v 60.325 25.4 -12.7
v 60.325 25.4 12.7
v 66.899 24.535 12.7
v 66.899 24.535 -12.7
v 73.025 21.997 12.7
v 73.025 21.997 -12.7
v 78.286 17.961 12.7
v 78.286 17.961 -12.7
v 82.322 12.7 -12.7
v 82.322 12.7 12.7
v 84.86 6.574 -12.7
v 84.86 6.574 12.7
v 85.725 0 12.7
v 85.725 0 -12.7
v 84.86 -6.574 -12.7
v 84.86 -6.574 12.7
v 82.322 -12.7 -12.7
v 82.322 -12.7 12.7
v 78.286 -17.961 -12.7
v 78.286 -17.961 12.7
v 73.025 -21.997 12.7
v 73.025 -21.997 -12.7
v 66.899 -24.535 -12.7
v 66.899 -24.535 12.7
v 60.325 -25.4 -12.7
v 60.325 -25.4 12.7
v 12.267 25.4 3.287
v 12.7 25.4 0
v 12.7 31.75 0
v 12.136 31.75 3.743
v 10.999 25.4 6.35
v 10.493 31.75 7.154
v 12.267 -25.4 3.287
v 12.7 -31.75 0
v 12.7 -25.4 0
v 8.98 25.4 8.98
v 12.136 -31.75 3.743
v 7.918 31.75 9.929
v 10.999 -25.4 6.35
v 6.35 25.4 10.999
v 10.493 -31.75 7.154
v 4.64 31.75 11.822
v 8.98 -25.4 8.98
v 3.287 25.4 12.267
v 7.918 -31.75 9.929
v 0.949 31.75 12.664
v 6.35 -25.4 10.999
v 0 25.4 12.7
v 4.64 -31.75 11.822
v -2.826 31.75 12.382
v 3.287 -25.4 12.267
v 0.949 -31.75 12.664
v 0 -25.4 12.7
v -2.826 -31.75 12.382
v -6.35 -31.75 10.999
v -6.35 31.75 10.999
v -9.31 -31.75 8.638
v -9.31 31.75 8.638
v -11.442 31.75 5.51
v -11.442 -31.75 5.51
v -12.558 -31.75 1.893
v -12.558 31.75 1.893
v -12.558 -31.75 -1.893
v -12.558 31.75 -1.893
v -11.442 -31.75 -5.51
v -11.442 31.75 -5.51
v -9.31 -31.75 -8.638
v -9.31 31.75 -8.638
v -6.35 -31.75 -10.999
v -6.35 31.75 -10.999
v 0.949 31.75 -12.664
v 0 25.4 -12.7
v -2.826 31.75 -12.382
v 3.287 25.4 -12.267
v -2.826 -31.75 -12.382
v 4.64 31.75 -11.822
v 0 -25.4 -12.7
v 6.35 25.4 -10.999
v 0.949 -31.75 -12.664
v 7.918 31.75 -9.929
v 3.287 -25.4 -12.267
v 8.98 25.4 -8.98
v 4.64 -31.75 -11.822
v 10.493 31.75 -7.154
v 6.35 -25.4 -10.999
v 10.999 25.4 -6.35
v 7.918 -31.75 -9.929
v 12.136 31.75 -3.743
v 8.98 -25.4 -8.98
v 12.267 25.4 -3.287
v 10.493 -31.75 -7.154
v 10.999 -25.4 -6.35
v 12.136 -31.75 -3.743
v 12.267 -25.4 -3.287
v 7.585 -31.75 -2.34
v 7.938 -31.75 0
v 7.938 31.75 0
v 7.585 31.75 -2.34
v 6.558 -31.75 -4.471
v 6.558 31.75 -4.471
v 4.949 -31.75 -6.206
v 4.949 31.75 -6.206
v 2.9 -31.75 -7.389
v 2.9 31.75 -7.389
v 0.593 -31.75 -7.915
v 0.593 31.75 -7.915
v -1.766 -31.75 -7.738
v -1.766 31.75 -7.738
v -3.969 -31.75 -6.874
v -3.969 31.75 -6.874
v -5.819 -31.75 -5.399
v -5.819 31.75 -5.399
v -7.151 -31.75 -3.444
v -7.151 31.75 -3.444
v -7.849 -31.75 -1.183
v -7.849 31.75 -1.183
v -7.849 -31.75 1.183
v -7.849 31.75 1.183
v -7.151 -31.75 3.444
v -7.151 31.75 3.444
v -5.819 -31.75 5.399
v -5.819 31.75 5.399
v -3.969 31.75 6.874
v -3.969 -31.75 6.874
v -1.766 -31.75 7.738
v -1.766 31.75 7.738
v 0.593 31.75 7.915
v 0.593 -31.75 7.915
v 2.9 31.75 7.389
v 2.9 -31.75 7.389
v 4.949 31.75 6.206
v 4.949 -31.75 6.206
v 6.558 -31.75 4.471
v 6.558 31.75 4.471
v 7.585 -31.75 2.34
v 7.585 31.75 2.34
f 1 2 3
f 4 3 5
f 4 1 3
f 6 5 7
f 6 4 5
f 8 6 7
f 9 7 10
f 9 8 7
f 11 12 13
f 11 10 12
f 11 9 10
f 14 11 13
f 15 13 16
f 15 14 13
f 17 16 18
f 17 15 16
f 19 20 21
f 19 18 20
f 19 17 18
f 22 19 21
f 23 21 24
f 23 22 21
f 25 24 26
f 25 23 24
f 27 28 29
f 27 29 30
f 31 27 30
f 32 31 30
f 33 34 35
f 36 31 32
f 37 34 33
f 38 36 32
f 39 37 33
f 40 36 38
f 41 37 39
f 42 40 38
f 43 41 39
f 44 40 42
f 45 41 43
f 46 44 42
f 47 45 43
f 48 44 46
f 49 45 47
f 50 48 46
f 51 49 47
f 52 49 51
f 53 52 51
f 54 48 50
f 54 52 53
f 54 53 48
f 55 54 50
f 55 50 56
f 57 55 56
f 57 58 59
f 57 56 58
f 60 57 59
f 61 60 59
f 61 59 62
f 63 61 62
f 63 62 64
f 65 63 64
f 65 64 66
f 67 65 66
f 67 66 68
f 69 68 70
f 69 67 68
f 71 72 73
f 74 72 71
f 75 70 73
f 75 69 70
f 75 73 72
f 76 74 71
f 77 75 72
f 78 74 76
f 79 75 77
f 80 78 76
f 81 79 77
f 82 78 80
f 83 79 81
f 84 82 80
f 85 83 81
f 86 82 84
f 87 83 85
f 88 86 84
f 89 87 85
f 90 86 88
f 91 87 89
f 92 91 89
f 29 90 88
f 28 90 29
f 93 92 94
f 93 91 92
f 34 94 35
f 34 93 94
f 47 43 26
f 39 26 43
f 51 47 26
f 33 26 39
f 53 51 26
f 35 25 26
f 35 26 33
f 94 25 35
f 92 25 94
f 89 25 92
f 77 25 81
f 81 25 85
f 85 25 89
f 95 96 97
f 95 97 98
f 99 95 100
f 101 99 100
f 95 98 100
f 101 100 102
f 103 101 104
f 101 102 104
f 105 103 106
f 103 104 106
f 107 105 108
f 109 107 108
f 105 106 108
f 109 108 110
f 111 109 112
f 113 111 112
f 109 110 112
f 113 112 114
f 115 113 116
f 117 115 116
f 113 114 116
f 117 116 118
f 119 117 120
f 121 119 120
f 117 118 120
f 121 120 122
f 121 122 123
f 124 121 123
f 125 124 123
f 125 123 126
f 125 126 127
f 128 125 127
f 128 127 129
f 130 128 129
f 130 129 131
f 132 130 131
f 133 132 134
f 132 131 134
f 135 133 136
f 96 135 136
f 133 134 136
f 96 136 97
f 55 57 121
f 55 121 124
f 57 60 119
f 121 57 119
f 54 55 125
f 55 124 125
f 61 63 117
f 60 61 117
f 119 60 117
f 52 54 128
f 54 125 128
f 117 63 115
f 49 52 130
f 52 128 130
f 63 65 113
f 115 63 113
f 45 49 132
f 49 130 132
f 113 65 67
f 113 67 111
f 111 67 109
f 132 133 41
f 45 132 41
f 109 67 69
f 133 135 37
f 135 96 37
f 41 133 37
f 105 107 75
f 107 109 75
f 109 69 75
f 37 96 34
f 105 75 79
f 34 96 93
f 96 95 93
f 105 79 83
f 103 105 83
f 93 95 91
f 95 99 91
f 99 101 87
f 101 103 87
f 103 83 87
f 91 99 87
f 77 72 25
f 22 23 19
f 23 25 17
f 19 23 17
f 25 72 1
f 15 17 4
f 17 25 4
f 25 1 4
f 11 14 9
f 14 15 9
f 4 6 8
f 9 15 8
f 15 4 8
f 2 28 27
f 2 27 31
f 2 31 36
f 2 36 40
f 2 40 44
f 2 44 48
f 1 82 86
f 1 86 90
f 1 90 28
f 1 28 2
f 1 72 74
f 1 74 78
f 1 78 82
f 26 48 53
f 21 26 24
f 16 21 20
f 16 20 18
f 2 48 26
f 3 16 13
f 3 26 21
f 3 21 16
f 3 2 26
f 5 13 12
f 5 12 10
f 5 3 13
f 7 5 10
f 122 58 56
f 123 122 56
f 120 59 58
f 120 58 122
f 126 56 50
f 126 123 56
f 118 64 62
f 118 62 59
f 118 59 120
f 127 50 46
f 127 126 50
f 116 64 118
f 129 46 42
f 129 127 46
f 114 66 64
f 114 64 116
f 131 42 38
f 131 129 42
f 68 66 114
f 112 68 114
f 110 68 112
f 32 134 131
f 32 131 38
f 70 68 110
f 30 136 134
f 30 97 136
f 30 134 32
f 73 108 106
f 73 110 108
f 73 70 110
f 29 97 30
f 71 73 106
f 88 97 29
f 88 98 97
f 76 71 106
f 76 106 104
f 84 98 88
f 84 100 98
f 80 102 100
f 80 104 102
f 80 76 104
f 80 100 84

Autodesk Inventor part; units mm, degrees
ref_plane "YZ Plane" through (0, 0, 0) normal (1, 0, 0) x (0, 1, 0)
ref_plane "XZ Plane" through (0, 0, 0) normal (0, 1, 0) x (-1, 0, 0)
ref_plane "XY Plane" through (0, 0, 0) normal (0, 0, 1) x (1, 0, 0)
sketch "Sketch1" plane through (0, 0, 0) normal (0, 0, 1) x (1, 0, 0)
  line L0 (0, 31.75) -> (12.7, 31.75)
  line L1 (12.7, 31.75) -> (12.7, -31.75)
  line L2 (12.7, -31.75) -> (0, -31.75)
  line L3 (0, -31.75) -> (0, 31.75)
  point P0 (0, 0)
  point P1 (0, 0)
  dimension "d0" = 25.4
  dimension "d1" = 63.5
revolve "Revolution1" add sketch "Sketch1" angle 360 about axis through (0, -31.75, 0) along (0, 1, 0)
sketch "Sketch2" plane through (0, 0, 0) normal (0, 0, 1) x (1, 0, 0)
  line L0 (0, -35.56) -> (0, 35.56) projected
  line L1 (0, 25.4) -> (60.325, 25.4)
  line L2 (60.325, 25.4) -> (60.325, -25.4)
  line L3 (60.325, -25.4) -> (0, -25.4)
  line L4 (0, -25.4) -> (0, 25.4)
  circle A0 centre (60.325, 0) radius 25.4
  point P0 (0, 0)
  dimension "d3" = 60.325
  dimension "d4" = 50.8
extrude "Extrusion1" add sketch "Sketch2" along normal mid plane 25.4
sketch "Sketch3" plane through (0, 31.75, 0) normal (0, 1, 0) x (1, 0, 0)
  circle A0 centre (0, 0) radius 12.7 projected
  circle A1 centre (0, 0) radius 7.9375
  dimension "d7" = 15.875
extrude "Extrusion2" cut sketch "Sketch3" against normal through all contours A1
